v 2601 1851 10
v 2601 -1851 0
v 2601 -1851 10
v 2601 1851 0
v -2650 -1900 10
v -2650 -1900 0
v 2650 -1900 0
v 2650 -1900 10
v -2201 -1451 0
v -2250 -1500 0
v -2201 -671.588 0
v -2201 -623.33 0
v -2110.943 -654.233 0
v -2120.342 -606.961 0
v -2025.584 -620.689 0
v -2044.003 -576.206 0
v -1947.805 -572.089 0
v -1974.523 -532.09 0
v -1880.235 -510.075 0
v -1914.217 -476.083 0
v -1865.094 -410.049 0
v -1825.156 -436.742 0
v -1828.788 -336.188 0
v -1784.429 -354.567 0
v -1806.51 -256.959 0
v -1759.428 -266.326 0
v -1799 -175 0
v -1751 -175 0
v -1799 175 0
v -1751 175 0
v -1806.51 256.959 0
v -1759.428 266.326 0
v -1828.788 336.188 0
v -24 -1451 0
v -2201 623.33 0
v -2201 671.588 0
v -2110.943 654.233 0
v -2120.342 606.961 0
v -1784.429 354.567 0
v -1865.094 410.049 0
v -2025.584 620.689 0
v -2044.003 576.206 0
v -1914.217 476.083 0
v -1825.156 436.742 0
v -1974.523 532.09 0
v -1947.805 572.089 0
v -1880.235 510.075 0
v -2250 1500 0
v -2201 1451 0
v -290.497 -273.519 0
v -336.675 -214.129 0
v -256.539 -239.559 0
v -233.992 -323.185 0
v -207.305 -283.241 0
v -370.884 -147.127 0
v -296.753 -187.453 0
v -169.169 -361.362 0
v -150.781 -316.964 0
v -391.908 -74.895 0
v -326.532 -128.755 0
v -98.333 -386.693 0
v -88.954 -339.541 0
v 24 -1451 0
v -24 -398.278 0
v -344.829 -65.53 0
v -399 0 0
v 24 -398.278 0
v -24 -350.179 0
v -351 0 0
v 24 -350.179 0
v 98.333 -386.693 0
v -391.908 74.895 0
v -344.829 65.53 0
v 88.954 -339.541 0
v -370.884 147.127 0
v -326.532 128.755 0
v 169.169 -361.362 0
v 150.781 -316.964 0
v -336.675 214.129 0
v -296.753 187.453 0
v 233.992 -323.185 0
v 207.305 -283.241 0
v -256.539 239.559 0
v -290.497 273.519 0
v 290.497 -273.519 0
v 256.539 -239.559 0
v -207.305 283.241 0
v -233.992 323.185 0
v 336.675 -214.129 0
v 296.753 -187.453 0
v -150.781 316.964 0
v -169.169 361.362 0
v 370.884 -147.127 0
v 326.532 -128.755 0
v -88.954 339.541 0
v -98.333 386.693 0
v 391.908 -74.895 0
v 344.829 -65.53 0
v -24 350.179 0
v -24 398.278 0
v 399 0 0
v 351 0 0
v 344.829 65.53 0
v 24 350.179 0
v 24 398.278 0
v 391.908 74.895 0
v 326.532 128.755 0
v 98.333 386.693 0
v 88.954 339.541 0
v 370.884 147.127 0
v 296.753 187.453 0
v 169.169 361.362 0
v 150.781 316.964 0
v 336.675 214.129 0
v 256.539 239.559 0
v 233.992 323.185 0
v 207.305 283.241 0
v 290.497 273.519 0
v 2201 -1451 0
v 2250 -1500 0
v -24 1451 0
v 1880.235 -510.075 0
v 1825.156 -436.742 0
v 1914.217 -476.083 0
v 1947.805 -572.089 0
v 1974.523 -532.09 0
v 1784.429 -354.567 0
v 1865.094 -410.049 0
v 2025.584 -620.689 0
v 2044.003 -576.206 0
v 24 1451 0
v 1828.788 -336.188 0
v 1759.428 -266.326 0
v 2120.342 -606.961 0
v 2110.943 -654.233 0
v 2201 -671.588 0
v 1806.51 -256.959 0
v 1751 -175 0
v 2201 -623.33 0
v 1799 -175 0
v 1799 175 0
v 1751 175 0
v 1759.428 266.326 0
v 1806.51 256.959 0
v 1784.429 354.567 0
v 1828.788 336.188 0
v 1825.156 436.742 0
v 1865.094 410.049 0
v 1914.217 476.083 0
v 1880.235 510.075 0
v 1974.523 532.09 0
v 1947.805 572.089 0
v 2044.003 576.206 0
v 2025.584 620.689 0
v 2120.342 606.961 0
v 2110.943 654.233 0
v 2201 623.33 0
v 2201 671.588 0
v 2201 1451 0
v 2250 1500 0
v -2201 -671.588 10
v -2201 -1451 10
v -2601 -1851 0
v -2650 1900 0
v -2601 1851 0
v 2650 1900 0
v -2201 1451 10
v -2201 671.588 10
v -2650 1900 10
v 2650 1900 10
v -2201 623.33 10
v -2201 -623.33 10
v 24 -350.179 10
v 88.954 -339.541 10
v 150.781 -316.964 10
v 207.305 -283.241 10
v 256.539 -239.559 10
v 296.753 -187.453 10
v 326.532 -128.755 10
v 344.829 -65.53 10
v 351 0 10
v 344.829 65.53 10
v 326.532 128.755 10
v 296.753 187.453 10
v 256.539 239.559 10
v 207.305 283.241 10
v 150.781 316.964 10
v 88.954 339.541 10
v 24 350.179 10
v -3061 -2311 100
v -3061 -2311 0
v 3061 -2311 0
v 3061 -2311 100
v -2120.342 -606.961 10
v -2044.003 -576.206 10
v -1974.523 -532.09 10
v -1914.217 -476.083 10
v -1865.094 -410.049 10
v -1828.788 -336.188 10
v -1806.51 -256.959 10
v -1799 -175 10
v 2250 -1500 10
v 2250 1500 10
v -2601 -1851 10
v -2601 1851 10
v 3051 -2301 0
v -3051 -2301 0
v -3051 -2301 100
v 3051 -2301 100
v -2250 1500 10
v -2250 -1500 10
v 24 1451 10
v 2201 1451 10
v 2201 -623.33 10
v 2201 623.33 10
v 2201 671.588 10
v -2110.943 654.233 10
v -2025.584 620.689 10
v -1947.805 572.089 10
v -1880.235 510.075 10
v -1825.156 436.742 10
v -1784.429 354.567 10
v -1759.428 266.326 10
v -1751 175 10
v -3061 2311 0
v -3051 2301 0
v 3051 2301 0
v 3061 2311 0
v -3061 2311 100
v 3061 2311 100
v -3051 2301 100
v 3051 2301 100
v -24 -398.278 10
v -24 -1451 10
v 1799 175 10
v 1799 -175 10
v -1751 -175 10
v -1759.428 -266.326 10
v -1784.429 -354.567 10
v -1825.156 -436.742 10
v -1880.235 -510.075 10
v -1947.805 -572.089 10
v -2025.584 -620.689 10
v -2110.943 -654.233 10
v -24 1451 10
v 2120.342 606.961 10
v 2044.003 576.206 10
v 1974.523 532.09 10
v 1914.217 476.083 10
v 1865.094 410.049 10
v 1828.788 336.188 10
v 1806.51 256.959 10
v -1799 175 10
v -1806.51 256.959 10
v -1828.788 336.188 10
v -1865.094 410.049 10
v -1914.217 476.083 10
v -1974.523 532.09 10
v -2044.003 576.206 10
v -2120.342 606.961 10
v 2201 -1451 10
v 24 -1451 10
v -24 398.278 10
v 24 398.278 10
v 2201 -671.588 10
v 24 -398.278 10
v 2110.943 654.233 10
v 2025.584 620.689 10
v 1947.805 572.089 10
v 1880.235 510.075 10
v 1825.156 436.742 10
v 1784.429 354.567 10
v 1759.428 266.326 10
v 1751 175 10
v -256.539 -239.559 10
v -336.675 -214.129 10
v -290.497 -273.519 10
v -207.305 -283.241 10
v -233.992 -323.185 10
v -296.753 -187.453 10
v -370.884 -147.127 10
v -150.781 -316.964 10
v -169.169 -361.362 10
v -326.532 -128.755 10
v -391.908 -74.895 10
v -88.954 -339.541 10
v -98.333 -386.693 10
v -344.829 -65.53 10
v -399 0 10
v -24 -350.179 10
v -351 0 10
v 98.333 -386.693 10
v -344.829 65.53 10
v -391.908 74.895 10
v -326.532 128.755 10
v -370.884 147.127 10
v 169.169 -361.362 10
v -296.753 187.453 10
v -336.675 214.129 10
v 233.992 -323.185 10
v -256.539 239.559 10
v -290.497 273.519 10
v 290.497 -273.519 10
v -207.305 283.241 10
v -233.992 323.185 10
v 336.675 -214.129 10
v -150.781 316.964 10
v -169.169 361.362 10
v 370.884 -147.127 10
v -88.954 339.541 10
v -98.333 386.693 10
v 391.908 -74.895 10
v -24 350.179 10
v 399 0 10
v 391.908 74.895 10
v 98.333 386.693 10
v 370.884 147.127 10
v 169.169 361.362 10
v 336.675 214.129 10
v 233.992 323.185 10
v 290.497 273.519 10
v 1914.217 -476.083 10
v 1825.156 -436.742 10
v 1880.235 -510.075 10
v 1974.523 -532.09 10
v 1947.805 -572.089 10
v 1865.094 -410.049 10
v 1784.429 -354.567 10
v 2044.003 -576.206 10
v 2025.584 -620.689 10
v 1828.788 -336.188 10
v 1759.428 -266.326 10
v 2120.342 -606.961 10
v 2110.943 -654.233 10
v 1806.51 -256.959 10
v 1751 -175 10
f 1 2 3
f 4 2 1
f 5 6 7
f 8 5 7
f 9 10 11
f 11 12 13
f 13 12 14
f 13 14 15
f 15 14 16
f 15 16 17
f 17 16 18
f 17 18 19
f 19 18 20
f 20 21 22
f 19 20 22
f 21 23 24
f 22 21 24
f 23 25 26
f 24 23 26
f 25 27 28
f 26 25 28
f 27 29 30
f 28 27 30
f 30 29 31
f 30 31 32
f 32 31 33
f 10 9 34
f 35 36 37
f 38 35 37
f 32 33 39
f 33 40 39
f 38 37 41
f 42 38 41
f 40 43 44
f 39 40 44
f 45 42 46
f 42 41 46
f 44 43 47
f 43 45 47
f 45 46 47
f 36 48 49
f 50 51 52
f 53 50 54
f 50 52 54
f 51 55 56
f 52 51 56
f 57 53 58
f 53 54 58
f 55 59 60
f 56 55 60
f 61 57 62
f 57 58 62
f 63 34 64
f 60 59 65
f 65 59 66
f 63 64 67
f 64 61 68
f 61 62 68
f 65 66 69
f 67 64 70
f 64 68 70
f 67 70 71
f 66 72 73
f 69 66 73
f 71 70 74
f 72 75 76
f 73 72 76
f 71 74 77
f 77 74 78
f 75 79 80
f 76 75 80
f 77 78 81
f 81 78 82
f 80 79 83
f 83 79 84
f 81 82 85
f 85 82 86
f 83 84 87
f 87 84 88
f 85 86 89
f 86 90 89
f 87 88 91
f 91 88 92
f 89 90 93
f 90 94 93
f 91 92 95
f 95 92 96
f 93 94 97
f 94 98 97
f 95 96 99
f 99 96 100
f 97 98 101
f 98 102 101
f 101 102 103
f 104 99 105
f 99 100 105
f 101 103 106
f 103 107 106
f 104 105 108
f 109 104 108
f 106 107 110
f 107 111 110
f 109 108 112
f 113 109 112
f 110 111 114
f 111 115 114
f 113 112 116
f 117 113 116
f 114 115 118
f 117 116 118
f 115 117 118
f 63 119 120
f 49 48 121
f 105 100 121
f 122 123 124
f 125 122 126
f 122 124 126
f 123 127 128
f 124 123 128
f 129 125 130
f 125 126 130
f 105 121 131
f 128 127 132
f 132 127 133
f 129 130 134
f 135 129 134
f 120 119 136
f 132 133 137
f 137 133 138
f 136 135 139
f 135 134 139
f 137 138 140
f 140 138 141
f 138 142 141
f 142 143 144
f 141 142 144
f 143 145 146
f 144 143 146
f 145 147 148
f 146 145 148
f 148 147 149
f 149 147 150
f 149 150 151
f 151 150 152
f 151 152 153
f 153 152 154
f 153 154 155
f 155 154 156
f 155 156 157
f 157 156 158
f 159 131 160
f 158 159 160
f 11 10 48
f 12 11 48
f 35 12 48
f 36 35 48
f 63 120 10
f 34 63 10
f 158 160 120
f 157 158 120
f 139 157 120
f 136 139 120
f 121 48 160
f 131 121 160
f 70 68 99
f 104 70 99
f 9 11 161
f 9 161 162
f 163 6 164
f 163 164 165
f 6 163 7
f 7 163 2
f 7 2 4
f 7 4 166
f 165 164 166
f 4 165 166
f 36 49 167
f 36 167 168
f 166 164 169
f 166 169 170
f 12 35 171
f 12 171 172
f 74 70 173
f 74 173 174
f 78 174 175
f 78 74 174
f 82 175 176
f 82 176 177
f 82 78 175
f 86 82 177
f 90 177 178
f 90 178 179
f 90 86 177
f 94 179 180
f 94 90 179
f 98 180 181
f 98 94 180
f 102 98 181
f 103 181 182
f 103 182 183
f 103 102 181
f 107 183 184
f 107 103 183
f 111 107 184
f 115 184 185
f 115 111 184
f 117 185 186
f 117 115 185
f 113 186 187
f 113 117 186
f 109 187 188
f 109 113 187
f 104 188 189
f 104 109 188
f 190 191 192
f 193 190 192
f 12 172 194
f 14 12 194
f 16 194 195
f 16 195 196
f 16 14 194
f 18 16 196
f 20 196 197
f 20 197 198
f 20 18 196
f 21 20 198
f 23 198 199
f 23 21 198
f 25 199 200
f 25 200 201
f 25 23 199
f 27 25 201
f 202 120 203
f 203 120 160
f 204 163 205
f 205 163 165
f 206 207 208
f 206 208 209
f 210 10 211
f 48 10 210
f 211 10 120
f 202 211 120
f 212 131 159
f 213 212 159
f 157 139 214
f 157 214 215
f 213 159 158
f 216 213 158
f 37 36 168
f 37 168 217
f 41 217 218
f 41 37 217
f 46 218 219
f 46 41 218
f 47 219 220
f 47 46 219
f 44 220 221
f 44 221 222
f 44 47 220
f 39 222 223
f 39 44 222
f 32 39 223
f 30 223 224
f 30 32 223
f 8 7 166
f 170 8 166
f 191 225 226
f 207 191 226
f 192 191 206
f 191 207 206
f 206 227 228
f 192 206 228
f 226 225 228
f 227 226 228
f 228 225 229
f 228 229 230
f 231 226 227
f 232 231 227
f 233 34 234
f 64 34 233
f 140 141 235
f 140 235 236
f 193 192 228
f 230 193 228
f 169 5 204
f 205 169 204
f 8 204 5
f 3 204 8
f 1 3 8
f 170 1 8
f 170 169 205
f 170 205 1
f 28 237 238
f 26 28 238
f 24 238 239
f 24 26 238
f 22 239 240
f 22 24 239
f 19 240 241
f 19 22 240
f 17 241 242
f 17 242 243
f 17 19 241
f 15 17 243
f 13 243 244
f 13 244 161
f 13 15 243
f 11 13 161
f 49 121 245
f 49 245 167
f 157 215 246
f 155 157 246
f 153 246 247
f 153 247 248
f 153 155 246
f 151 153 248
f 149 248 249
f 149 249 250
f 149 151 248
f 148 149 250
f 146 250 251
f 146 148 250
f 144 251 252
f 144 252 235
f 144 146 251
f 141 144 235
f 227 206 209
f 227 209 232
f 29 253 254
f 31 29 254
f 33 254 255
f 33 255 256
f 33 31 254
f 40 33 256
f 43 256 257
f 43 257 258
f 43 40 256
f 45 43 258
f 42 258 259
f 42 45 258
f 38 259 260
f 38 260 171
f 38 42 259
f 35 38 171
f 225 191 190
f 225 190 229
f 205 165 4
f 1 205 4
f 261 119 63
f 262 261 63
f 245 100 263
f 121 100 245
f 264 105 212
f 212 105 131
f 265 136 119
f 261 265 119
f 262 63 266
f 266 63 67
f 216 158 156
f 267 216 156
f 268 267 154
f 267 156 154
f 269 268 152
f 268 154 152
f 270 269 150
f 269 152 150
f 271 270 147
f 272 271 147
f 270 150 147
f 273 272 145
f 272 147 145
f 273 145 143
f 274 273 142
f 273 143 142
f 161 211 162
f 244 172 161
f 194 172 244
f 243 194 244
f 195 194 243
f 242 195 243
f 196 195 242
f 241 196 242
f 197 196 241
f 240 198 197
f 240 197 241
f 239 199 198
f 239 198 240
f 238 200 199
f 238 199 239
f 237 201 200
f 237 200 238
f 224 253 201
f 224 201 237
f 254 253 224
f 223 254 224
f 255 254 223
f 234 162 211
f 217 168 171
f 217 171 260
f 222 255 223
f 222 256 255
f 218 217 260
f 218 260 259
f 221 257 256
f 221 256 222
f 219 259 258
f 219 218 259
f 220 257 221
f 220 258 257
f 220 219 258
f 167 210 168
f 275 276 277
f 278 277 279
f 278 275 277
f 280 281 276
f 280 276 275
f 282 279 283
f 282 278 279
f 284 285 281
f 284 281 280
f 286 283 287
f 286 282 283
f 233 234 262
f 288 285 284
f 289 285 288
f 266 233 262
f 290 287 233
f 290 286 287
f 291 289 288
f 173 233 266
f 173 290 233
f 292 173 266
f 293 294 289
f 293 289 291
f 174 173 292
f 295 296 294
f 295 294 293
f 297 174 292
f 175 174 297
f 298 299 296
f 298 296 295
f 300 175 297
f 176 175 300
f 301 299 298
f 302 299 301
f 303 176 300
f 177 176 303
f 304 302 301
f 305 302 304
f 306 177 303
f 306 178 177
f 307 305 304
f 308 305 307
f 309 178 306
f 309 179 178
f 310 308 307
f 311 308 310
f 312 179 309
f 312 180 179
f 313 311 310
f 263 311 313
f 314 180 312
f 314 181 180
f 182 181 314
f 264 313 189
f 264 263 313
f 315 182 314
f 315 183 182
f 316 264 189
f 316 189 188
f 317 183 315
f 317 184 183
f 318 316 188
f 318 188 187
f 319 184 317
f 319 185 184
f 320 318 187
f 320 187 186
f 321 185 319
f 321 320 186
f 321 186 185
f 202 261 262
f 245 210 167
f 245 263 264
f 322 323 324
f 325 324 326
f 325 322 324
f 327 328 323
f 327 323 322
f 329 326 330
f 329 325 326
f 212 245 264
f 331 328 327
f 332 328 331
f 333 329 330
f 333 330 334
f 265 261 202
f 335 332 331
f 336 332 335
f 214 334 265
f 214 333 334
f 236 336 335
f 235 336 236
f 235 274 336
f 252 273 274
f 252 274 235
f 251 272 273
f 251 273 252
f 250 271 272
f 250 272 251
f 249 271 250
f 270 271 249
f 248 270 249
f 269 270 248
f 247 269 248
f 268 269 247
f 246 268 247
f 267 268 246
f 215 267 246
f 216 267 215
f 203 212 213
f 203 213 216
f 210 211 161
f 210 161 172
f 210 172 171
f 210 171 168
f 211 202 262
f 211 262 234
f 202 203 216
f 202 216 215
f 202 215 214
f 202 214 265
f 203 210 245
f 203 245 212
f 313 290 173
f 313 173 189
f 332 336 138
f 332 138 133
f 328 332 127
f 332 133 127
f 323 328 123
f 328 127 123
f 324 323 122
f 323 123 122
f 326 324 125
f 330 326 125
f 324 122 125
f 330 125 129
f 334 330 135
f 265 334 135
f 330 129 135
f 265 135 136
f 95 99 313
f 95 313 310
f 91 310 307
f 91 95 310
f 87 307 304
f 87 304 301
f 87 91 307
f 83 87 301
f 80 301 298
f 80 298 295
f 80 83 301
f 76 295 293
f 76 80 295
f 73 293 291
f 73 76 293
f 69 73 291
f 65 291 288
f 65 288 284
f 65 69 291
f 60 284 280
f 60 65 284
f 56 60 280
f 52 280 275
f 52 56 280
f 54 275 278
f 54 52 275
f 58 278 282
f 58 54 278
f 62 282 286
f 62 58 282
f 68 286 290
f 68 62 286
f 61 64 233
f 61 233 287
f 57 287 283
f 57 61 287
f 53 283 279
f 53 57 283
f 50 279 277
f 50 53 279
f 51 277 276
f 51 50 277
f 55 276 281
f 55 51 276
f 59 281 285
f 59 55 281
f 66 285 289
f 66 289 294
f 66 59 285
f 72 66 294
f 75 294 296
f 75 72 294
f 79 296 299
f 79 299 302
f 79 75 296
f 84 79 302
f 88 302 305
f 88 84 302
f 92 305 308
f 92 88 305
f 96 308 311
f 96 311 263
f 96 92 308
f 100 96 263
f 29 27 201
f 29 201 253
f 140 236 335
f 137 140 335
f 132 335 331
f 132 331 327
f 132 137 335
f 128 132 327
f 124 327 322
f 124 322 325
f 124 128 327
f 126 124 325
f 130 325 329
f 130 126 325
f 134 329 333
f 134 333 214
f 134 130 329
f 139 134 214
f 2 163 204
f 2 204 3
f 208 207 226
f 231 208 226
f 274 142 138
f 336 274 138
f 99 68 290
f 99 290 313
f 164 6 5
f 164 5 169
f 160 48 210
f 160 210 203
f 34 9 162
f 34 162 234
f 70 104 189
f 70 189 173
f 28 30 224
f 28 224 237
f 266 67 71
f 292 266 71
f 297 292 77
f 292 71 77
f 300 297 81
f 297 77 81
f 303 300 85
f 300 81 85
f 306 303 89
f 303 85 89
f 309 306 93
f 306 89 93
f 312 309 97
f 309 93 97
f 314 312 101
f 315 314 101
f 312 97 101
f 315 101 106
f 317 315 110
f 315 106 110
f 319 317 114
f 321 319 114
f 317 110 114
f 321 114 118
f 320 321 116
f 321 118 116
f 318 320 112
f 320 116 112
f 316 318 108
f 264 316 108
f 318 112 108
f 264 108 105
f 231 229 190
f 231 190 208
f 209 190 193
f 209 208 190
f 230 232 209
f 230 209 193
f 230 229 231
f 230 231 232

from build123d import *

# Parameters (mm, degrees)
SKETCH1_W             = 4500
SKETCH1_H             = 3000
BOSS_EXTRUDE1_DEPTH   = 10
SKETCH1_W_2           = 5300
SKETCH1_H_2           = 3800
SKETCH1_W_3           = 5202
SKETCH1_H_3           = 3702
BOSS_EXTRUDE1_2_DEPTH = 10
SKETCH1_3_W           = 6122
SKETCH1_3_H           = 4622
SKETCH1_3_W_2         = 6102
SKETCH1_3_H_2         = 4602
BOSS_EXTRUDE2_DEPTH   = 100


with BuildPart() as part:
    # Sketch1 → Boss-Extrude1 (new body)
    with BuildSketch(Plane.XY):
        Rectangle(SKETCH1_W, SKETCH1_H)
        with BuildLine():
            ThreePointArc((1799, -175), (1914.217332192, -476.083045022), (2201, -623.330235429))
            Line((2201, -623.330235429), (2201, 623.330235429))
            ThreePointArc((2201, 623.330235429), (1914.217332192, 476.083045022), (1799, 175))
            Line((1799, 175), (1799, -175))
        make_face(mode=Mode.SUBTRACT)
        with BuildLine():
            Line((-24, 398.277541421), (-24, 1451))
            Line((-24, 1451), (-2201, 1451))
            Line((-2201, 1451), (-2201, 671.588360717))
            ThreePointArc((-2201, 671.588360717), (-1880.235209897, 510.074618555), (-1751, 175))
            Line((-1751, 175), (-1751, -175))
            ThreePointArc((-1751, -175), (-1880.235209897, -510.074618555), (-2201, -671.588360717))
            Line((-2201, -671.588360717), (-2201, -1451))
            Line((-2201, -1451), (-24, -1451))
            Line((-24, -1451), (-24, -398.277541421))
            ThreePointArc((-24, -398.277541421), (-399, 0), (-24, 398.277541421))
        make_face(mode=Mode.SUBTRACT)
        with BuildLine():
            ThreePointArc((-2201, -623.330235429), (-1914.217332192, -476.083045022), (-1799, -175))
            Line((-1799, -175), (-1799, 175))
            ThreePointArc((-1799, 175), (-1914.217332192, 476.083045022), (-2201, 623.330235429))
            Line((-2201, 623.330235429), (-2201, -623.330235429))
        make_face(mode=Mode.SUBTRACT)
        with BuildLine():
            ThreePointArc((-24, 350.178525898), (-351, 0), (-24, -350.178525898))
            Line((-24, -350.178525898), (-24, 350.178525898))
        make_face(mode=Mode.SUBTRACT)
        with BuildLine():
            ThreePointArc((24, -350.178525898), (351, 0), (24, 350.178525898))
            Line((24, 350.178525898), (24, -350.178525898))
        make_face(mode=Mode.SUBTRACT)
        with BuildLine():
            Line((24, -1451), (24, -398.277541421))
            ThreePointArc((24, -398.277541421), (399, 0), (24, 398.277541421))
            Line((24, 398.277541421), (24, 1451))
            Line((24, 1451), (2201, 1451))
            Line((2201, 1451), (2201, 671.588360717))
            ThreePointArc((2201, 671.588360717), (1880.235209897, 510.074618555), (1751, 175))
            Line((1751, 175), (1751, -175))
            ThreePointArc((1751, -175), (1880.235209897, -510.074618555), (2201, -671.588360717))
            Line((2201, -671.588360717), (2201, -1451))
            Line((2201, -1451), (24, -1451))
        make_face(mode=Mode.SUBTRACT)
    extrude(amount=BOSS_EXTRUDE1_DEPTH)


with BuildPart() as body_2:
    # Sketch1 → Boss-Extrude1 2 (new body)
    with BuildSketch(Plane.XY):
        Rectangle(SKETCH1_W_2, SKETCH1_H_2)
        Rectangle(SKETCH1_W_3, SKETCH1_H_3, mode=Mode.SUBTRACT)
    extrude(amount=BOSS_EXTRUDE1_2_DEPTH)


with BuildPart() as body_3:
    # Sketch1<3> → Boss-Extrude2 (new body)
    with BuildSketch(Plane.XY):
        Rectangle(SKETCH1_3_W, SKETCH1_3_H)
        Rectangle(SKETCH1_3_W_2, SKETCH1_3_H_2, mode=Mode.SUBTRACT)
    extrude(amount=BOSS_EXTRUDE2_DEPTH)


solid = Compound([part.part, body_2.part, body_3.part])
